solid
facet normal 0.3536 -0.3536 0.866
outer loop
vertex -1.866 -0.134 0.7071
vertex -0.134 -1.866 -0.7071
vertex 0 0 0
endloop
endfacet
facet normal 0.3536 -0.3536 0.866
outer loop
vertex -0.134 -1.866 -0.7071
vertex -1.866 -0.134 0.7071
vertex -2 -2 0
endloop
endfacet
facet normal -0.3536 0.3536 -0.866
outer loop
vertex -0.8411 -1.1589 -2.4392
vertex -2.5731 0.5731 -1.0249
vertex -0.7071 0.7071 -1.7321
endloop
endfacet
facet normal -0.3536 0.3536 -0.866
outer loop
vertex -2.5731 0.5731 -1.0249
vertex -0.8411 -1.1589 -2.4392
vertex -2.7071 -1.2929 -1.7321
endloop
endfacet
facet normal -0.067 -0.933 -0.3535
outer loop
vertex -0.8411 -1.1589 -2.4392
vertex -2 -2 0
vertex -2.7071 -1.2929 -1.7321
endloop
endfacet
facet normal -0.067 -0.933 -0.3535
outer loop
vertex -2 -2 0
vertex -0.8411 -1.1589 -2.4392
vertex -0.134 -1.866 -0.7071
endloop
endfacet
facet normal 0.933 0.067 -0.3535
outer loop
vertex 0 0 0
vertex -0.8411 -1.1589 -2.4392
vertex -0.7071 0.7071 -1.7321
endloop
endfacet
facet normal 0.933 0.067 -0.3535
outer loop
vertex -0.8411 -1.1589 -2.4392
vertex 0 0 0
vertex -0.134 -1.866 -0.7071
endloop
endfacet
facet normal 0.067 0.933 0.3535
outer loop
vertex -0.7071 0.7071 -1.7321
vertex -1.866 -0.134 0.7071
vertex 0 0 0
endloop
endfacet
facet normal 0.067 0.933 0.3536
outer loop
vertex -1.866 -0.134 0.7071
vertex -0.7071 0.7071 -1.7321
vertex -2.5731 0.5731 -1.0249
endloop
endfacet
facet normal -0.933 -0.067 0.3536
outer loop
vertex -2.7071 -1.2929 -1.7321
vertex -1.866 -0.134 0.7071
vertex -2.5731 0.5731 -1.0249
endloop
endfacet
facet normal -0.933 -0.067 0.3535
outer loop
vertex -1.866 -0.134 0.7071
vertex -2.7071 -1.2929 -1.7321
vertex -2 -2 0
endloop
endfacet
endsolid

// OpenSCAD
$fn=5;
rotate(30,[1,1,0])
{
	translate([-2,-2,-2])
	{
		rotate(0,[0,0,1])
		{
			cube([2,2,2]);
		}
	}
}
